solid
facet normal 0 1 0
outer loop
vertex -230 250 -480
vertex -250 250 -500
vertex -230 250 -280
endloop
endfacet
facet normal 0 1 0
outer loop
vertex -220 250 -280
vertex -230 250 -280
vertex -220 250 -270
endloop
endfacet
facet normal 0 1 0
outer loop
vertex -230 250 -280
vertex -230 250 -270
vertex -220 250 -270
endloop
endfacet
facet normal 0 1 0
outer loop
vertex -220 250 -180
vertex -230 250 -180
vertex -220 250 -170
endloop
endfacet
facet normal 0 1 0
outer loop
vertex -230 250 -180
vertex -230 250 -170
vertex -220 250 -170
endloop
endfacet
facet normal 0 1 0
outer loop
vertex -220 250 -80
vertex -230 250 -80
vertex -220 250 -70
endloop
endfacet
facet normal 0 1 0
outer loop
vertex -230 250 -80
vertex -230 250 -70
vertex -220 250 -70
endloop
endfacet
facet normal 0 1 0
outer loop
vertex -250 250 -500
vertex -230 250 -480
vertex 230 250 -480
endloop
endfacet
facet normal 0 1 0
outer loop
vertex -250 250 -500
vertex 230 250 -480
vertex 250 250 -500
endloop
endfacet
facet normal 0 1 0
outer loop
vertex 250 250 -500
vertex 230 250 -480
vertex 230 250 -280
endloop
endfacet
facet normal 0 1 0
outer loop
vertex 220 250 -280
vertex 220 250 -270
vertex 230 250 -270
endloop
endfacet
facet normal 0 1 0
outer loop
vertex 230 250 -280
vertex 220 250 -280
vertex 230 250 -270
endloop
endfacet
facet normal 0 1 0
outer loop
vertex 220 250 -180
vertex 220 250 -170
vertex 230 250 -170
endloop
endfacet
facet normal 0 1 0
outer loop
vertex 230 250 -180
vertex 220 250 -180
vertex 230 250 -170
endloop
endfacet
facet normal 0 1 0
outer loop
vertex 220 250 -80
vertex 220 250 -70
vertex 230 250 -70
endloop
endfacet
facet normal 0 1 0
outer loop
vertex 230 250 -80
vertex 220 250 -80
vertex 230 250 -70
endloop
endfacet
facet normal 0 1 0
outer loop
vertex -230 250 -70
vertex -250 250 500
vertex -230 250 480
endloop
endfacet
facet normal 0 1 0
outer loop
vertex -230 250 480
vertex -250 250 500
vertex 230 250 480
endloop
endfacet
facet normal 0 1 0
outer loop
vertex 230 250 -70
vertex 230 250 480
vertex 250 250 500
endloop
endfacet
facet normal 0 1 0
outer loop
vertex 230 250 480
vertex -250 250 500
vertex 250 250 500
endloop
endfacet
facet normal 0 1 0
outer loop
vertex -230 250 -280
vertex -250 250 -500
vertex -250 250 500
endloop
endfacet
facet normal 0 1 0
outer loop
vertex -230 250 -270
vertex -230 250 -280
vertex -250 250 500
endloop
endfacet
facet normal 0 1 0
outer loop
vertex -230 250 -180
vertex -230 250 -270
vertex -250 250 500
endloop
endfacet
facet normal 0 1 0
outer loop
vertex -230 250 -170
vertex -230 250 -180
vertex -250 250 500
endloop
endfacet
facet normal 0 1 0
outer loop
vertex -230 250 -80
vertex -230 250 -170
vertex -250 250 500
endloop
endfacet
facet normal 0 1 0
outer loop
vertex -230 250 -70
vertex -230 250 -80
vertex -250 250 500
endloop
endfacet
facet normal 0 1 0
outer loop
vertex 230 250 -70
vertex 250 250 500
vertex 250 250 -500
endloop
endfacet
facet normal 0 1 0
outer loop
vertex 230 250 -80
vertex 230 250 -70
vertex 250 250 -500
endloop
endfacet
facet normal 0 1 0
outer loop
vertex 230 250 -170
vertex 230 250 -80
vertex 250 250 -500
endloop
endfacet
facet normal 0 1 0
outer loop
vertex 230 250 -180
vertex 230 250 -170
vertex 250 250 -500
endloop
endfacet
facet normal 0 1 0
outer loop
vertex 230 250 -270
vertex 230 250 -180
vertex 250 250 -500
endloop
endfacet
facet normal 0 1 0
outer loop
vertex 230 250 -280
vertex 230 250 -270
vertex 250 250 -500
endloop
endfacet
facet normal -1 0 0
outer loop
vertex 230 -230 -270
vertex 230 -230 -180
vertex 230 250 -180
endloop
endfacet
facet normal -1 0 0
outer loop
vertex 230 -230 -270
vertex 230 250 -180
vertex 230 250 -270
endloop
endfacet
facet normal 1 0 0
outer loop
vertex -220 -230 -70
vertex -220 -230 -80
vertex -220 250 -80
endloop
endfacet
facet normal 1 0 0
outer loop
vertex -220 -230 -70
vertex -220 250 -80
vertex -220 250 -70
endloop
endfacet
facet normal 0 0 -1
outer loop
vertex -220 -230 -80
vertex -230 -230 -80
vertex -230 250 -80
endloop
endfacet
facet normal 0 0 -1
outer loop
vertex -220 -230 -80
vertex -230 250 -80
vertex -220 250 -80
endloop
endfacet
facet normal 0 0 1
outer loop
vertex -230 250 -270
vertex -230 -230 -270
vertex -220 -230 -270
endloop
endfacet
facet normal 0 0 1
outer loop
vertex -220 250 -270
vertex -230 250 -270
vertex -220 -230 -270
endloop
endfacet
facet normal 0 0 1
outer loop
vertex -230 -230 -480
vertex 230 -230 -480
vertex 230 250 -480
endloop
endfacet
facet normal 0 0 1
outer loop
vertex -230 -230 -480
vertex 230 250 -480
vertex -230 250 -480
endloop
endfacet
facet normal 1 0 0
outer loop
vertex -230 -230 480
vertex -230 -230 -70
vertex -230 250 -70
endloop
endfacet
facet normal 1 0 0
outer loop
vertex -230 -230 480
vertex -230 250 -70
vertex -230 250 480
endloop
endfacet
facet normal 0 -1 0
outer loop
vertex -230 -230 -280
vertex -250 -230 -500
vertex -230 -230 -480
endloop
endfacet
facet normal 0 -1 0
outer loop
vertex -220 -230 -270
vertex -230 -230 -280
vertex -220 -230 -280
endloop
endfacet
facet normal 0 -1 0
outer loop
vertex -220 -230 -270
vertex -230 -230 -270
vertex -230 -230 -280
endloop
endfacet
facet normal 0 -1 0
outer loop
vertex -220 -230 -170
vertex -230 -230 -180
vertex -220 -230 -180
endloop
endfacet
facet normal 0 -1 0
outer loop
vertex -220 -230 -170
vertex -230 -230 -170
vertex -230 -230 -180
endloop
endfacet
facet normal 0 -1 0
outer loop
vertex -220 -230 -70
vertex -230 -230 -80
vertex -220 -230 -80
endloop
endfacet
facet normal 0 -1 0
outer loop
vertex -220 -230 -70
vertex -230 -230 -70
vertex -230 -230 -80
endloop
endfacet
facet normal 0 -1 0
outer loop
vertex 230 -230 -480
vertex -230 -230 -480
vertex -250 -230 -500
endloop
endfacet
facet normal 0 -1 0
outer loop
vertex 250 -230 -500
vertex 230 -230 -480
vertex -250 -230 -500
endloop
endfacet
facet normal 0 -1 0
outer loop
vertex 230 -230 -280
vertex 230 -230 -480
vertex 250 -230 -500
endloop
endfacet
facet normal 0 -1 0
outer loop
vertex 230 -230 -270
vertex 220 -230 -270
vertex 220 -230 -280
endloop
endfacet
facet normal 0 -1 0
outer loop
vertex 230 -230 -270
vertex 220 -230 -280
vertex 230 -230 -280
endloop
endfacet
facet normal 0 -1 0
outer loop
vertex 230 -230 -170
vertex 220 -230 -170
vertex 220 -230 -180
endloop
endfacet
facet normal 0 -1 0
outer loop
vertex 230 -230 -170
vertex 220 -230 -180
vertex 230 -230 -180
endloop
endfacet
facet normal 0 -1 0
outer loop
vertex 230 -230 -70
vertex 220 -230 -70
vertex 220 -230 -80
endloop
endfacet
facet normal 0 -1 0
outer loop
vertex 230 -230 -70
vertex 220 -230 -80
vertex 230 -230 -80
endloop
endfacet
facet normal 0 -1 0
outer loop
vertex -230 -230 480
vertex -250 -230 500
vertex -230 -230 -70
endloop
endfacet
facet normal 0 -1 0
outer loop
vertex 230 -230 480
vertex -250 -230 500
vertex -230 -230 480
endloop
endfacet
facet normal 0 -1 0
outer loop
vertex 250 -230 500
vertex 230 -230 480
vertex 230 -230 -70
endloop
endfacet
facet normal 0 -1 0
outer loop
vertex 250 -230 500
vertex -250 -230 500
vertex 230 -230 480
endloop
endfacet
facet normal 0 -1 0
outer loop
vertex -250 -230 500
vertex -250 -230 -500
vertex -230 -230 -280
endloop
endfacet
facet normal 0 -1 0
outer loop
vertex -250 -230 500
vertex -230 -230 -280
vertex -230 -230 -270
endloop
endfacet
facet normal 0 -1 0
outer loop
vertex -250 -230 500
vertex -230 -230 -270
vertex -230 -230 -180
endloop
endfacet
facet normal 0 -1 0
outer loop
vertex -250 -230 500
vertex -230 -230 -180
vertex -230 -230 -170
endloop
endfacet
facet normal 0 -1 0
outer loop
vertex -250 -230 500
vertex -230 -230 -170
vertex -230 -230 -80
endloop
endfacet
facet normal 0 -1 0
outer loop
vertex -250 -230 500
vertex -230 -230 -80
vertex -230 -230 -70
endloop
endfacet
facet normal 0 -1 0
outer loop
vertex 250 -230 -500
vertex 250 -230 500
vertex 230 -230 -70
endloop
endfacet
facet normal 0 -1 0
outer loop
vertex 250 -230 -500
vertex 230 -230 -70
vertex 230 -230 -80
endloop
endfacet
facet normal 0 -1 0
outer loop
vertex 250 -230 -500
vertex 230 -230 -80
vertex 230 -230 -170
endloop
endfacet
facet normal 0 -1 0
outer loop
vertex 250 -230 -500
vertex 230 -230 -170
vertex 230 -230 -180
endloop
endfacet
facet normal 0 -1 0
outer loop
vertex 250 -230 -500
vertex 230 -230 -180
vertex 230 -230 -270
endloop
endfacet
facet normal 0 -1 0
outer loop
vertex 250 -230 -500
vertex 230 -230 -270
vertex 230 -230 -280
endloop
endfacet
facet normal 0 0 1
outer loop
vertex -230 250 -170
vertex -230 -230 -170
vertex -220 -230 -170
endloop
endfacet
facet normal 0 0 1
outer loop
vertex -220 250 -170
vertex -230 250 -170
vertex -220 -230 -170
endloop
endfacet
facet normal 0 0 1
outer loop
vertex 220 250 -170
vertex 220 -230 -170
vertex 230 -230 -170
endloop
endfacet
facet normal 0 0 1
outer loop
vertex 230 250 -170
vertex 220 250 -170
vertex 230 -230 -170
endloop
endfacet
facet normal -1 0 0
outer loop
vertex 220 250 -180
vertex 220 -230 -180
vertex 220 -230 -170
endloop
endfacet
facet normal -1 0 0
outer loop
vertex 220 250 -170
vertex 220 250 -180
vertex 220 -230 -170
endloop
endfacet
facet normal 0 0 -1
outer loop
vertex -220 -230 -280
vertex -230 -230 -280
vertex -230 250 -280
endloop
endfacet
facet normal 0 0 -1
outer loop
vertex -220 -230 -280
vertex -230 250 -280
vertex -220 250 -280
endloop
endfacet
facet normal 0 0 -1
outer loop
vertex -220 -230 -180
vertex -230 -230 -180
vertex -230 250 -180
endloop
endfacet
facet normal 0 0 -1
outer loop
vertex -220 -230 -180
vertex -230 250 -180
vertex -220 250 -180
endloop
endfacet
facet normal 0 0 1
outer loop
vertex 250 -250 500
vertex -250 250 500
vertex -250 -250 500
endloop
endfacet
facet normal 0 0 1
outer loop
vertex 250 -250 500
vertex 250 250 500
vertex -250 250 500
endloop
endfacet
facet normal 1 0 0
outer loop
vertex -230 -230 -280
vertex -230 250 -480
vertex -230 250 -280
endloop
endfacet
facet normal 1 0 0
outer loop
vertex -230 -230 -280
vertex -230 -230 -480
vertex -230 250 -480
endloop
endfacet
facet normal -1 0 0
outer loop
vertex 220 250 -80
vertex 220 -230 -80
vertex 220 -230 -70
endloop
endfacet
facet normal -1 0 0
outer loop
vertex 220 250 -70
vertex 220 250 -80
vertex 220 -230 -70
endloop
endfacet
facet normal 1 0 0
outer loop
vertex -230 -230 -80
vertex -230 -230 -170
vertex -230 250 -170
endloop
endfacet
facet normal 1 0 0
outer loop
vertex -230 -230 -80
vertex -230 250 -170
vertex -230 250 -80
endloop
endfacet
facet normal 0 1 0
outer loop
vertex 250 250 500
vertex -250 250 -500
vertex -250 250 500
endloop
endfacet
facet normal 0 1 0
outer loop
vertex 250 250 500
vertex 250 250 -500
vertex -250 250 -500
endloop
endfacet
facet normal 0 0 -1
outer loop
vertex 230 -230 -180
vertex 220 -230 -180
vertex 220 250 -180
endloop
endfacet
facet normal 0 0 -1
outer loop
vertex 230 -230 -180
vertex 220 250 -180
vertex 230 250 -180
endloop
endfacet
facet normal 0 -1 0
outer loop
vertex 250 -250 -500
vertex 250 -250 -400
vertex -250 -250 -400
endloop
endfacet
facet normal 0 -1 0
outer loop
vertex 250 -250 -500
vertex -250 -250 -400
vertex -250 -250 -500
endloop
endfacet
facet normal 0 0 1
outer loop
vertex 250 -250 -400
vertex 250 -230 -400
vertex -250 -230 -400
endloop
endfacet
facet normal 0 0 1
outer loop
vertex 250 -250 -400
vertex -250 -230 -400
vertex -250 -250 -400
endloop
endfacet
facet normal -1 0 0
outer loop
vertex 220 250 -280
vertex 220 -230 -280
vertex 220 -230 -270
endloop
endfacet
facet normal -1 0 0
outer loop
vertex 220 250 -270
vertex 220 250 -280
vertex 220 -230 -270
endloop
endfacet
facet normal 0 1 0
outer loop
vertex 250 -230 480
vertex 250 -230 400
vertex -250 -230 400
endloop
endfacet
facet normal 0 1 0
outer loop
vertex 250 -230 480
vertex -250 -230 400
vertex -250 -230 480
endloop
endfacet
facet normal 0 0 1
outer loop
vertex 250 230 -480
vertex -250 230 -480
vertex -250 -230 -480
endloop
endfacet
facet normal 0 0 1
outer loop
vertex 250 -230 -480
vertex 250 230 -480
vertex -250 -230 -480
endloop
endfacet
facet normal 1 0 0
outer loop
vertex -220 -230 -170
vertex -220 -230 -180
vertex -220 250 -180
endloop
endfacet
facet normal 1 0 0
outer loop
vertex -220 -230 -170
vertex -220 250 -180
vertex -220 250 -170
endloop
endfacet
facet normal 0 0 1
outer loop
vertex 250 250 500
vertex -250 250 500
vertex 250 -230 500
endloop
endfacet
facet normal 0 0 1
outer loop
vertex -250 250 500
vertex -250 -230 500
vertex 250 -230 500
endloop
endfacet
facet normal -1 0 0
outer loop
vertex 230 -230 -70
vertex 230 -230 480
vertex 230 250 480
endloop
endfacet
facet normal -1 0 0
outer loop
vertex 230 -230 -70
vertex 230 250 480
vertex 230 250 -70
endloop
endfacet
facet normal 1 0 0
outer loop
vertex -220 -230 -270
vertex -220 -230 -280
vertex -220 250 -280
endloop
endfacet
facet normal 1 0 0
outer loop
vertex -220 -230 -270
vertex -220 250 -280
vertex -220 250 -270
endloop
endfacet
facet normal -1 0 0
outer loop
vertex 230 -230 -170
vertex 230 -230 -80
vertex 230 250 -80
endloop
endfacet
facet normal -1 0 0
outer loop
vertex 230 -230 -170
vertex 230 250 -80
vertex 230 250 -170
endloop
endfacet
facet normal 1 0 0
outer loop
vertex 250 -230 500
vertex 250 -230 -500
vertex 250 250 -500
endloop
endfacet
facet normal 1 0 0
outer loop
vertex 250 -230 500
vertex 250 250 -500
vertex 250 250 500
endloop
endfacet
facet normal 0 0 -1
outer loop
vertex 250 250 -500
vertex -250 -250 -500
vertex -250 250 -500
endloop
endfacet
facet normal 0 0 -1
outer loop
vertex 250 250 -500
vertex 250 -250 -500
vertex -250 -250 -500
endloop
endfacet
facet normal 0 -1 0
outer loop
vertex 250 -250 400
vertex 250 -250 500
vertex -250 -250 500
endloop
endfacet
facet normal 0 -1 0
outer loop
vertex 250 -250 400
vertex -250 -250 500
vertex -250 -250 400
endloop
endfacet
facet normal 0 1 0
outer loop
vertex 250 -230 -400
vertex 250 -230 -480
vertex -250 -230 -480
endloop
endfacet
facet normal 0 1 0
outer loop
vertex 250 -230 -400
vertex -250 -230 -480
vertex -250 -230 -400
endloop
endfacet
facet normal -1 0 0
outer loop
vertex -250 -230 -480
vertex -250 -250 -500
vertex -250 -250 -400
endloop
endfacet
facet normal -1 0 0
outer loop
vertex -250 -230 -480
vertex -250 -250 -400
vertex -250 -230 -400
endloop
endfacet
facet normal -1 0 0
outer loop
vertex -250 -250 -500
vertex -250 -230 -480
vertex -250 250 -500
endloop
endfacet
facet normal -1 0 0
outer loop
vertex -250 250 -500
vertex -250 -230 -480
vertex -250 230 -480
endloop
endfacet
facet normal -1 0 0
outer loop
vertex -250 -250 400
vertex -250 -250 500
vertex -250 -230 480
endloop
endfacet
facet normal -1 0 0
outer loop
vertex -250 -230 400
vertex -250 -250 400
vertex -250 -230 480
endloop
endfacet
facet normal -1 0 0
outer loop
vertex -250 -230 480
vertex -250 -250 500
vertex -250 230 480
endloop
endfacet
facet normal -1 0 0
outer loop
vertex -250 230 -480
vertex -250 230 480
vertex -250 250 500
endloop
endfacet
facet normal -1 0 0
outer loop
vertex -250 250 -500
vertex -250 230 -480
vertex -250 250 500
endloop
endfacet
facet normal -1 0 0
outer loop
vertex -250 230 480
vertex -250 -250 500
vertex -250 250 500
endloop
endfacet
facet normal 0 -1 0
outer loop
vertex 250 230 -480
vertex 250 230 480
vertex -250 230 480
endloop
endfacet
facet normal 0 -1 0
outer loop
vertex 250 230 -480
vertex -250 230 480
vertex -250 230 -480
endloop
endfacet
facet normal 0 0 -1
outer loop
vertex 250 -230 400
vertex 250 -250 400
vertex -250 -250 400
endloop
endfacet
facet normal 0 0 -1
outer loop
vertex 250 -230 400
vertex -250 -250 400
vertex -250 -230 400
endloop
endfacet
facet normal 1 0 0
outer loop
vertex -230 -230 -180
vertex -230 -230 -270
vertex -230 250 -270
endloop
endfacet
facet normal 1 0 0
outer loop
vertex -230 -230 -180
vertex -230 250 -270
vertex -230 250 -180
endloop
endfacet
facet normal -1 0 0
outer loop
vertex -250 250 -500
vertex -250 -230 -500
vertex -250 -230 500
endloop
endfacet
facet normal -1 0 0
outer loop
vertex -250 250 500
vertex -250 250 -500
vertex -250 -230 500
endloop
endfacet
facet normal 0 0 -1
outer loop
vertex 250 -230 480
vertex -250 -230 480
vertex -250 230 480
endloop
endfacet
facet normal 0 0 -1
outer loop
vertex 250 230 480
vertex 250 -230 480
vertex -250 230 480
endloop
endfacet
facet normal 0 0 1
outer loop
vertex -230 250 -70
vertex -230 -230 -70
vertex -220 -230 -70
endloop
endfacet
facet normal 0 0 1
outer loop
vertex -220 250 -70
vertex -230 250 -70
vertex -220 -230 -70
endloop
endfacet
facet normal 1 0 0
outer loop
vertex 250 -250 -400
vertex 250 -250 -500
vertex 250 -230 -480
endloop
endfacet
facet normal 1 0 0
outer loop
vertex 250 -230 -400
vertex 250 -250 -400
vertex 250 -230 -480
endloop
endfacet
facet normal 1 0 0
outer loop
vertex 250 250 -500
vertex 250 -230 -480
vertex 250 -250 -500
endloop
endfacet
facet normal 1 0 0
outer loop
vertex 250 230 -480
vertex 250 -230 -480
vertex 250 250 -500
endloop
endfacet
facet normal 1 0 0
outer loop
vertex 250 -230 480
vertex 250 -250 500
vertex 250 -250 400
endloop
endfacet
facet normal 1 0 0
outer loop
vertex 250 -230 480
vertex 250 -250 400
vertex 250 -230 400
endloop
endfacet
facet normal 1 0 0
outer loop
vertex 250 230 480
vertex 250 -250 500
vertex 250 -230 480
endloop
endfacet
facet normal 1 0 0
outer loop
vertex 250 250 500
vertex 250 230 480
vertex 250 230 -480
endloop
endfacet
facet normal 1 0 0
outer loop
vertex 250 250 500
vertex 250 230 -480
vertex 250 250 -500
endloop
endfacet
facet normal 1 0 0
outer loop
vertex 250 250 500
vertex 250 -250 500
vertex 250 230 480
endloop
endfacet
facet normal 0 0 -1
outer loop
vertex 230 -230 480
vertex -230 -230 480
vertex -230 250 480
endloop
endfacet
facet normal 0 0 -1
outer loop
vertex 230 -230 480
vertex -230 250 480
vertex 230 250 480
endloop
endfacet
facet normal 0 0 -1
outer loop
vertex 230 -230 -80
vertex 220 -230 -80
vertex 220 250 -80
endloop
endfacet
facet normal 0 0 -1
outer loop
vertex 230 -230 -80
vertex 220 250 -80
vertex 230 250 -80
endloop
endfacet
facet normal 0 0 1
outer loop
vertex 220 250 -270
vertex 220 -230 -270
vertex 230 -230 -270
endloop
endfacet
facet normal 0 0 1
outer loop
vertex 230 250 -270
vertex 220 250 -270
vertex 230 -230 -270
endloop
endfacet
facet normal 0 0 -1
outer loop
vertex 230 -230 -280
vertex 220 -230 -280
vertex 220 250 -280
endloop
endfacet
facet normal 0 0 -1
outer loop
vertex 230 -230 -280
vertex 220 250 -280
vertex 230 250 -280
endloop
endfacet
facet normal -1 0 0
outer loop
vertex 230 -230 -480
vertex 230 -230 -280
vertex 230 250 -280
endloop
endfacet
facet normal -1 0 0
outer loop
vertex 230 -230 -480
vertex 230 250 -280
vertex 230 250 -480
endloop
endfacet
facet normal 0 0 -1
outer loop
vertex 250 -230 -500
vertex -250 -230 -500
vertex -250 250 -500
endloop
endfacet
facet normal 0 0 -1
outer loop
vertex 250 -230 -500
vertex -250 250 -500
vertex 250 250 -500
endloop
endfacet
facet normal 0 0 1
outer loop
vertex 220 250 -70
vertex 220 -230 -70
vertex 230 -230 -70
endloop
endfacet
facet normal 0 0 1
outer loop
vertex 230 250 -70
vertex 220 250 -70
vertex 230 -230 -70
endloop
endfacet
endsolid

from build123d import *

# Parameters (mm, degrees)
F0_W          = 500
F0_H          = 1000
F0_W_2        = 10
F0_H_2        = 10
F2_DEPTH      = 230
F2_DEPTH_BACK = 250
F3_DEPTH      = 250
F3_DEPTH_BACK = 250


with BuildPart() as f2:
    # F0 (on Front) → F2 (new body, two sides)
    with BuildSketch(Plane.XZ) as f2_sk:
        Rectangle(F0_W, F0_H)
        Polygon((-230, 380), (-230, 480), (230, 480), (230, 380), (230, -70), (230, -80), (230, -170), (230, -180), (230, -270), (230, -280), (230, -480), (-230, -480), (-230, -280), (-230, -270), (-230, -180), (-230, -170), (-230, -80), (-230, -70), align=None, mode=Mode.SUBTRACT)
        with Locations((-225, -75)):
            Rectangle(F0_W_2, F0_H_2)
        with Locations((-225, -175)):
            Rectangle(F0_W_2, F0_H_2)
        with Locations((-225, -275)):
            Rectangle(F0_W_2, F0_H_2)
        with Locations((225, -275)):
            Rectangle(F0_W_2, F0_H_2)
        with Locations((225, -175)):
            Rectangle(F0_W_2, F0_H_2)
        with Locations((225, -75)):
            Rectangle(F0_W_2, F0_H_2)
    extrude(amount=F2_DEPTH)
    extrude(f2_sk.sketch, amount=-F2_DEPTH_BACK)


with BuildPart() as f3:
    # F1 (on Right) → F3 (new body, two sides)
    with BuildSketch(Plane.YZ) as f3_sk:
        Polygon((250, 500), (-250, 500), (-250, 400), (-230, 400), (-230, 480), (230, 480), (230, -480), (-230, -480), (-230, -400), (-250, -400), (-250, -500), (250, -500), align=None)
    extrude(amount=F3_DEPTH)
    extrude(f3_sk.sketch, amount=-F3_DEPTH_BACK)


solid = Compound([f2.part, f3.part])
